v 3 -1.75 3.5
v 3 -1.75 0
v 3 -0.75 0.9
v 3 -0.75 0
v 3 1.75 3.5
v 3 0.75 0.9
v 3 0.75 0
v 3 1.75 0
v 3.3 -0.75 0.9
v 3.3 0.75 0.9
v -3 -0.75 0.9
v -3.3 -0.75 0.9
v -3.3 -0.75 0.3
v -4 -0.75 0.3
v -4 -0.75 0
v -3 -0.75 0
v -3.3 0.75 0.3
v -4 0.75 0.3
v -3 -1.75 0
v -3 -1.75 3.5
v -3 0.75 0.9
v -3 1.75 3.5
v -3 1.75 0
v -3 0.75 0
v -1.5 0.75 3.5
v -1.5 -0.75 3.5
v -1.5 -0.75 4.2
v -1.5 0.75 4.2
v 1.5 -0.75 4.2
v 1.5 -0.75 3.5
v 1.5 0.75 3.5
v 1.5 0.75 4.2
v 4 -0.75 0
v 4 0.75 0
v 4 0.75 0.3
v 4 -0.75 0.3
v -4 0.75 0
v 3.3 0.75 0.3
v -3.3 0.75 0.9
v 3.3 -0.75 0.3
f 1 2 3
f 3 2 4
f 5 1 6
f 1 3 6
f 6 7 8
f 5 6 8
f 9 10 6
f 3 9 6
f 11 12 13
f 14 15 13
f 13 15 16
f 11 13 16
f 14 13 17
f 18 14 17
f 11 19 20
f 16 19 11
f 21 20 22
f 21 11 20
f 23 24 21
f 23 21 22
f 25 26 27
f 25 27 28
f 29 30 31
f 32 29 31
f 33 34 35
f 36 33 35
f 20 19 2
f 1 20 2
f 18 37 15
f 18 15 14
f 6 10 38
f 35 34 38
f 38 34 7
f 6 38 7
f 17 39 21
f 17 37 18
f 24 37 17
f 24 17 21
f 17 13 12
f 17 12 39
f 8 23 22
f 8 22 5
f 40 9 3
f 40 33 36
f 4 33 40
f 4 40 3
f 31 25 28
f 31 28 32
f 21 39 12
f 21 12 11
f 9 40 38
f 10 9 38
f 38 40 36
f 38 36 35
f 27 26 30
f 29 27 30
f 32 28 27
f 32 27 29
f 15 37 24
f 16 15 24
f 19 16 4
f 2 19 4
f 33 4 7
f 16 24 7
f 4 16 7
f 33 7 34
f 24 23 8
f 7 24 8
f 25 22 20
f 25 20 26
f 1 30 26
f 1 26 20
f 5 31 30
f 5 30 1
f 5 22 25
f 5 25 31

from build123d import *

# Parameters (mm, degrees)
SKETCH1_W           = 6
SKETCH1_H           = 3.5
BOSS_EXTRUDE1_DEPTH = 3.5
SKETCH2_W           = 3
SKETCH2_H           = 1.5
BOSS_EXTRUDE2_DEPTH = 0.7
SKETCH3_W           = 0.3
SKETCH3_H           = 1.5
BOSS_EXTRUDE3_DEPTH = 1
SKETCH4_W           = 0.3
SKETCH4_H           = 1.5
BOSS_EXTRUDE4_DEPTH = 0.6


with BuildPart() as part:
    # Sketch1 → Boss-Extrude1 (new body)
    with BuildSketch(Plane.XY):
        Rectangle(SKETCH1_W, SKETCH1_H)
    extrude(amount=BOSS_EXTRUDE1_DEPTH)

    # Sketch2 → Boss-Extrude2 (add)
    with BuildSketch(Plane.XY.offset(3.5)):
        Rectangle(SKETCH2_W, SKETCH2_H)
    extrude(amount=BOSS_EXTRUDE2_DEPTH)

    # Sketch3 → Boss-Extrude3 (add)
    with BuildSketch(Plane.ZY.offset(3)):
        with Locations((0.15, 0)):
            Rectangle(SKETCH3_W, SKETCH3_H)
    boss_extrude3 = extrude(amount=BOSS_EXTRUDE3_DEPTH)

    # Sketch4 → Boss-Extrude4 (add)
    with BuildSketch(Plane.XY.offset(0.3)):
        with Locations((-3.15, 0)):
            Rectangle(SKETCH4_W, SKETCH4_H)
    boss_extrude4 = extrude(amount=BOSS_EXTRUDE4_DEPTH)

    # Mirror1: Boss-Extrude3, Boss-Extrude4 across plane
    add(boss_extrude3.mirror(Plane(origin=(0, 0, 0), x_dir=(0, 0, 1), z_dir=(1, 0, 0))))
    add(boss_extrude4.mirror(Plane(origin=(0, 0, 0), x_dir=(0, 0, 1), z_dir=(1, 0, 0))))


solid = part.part
